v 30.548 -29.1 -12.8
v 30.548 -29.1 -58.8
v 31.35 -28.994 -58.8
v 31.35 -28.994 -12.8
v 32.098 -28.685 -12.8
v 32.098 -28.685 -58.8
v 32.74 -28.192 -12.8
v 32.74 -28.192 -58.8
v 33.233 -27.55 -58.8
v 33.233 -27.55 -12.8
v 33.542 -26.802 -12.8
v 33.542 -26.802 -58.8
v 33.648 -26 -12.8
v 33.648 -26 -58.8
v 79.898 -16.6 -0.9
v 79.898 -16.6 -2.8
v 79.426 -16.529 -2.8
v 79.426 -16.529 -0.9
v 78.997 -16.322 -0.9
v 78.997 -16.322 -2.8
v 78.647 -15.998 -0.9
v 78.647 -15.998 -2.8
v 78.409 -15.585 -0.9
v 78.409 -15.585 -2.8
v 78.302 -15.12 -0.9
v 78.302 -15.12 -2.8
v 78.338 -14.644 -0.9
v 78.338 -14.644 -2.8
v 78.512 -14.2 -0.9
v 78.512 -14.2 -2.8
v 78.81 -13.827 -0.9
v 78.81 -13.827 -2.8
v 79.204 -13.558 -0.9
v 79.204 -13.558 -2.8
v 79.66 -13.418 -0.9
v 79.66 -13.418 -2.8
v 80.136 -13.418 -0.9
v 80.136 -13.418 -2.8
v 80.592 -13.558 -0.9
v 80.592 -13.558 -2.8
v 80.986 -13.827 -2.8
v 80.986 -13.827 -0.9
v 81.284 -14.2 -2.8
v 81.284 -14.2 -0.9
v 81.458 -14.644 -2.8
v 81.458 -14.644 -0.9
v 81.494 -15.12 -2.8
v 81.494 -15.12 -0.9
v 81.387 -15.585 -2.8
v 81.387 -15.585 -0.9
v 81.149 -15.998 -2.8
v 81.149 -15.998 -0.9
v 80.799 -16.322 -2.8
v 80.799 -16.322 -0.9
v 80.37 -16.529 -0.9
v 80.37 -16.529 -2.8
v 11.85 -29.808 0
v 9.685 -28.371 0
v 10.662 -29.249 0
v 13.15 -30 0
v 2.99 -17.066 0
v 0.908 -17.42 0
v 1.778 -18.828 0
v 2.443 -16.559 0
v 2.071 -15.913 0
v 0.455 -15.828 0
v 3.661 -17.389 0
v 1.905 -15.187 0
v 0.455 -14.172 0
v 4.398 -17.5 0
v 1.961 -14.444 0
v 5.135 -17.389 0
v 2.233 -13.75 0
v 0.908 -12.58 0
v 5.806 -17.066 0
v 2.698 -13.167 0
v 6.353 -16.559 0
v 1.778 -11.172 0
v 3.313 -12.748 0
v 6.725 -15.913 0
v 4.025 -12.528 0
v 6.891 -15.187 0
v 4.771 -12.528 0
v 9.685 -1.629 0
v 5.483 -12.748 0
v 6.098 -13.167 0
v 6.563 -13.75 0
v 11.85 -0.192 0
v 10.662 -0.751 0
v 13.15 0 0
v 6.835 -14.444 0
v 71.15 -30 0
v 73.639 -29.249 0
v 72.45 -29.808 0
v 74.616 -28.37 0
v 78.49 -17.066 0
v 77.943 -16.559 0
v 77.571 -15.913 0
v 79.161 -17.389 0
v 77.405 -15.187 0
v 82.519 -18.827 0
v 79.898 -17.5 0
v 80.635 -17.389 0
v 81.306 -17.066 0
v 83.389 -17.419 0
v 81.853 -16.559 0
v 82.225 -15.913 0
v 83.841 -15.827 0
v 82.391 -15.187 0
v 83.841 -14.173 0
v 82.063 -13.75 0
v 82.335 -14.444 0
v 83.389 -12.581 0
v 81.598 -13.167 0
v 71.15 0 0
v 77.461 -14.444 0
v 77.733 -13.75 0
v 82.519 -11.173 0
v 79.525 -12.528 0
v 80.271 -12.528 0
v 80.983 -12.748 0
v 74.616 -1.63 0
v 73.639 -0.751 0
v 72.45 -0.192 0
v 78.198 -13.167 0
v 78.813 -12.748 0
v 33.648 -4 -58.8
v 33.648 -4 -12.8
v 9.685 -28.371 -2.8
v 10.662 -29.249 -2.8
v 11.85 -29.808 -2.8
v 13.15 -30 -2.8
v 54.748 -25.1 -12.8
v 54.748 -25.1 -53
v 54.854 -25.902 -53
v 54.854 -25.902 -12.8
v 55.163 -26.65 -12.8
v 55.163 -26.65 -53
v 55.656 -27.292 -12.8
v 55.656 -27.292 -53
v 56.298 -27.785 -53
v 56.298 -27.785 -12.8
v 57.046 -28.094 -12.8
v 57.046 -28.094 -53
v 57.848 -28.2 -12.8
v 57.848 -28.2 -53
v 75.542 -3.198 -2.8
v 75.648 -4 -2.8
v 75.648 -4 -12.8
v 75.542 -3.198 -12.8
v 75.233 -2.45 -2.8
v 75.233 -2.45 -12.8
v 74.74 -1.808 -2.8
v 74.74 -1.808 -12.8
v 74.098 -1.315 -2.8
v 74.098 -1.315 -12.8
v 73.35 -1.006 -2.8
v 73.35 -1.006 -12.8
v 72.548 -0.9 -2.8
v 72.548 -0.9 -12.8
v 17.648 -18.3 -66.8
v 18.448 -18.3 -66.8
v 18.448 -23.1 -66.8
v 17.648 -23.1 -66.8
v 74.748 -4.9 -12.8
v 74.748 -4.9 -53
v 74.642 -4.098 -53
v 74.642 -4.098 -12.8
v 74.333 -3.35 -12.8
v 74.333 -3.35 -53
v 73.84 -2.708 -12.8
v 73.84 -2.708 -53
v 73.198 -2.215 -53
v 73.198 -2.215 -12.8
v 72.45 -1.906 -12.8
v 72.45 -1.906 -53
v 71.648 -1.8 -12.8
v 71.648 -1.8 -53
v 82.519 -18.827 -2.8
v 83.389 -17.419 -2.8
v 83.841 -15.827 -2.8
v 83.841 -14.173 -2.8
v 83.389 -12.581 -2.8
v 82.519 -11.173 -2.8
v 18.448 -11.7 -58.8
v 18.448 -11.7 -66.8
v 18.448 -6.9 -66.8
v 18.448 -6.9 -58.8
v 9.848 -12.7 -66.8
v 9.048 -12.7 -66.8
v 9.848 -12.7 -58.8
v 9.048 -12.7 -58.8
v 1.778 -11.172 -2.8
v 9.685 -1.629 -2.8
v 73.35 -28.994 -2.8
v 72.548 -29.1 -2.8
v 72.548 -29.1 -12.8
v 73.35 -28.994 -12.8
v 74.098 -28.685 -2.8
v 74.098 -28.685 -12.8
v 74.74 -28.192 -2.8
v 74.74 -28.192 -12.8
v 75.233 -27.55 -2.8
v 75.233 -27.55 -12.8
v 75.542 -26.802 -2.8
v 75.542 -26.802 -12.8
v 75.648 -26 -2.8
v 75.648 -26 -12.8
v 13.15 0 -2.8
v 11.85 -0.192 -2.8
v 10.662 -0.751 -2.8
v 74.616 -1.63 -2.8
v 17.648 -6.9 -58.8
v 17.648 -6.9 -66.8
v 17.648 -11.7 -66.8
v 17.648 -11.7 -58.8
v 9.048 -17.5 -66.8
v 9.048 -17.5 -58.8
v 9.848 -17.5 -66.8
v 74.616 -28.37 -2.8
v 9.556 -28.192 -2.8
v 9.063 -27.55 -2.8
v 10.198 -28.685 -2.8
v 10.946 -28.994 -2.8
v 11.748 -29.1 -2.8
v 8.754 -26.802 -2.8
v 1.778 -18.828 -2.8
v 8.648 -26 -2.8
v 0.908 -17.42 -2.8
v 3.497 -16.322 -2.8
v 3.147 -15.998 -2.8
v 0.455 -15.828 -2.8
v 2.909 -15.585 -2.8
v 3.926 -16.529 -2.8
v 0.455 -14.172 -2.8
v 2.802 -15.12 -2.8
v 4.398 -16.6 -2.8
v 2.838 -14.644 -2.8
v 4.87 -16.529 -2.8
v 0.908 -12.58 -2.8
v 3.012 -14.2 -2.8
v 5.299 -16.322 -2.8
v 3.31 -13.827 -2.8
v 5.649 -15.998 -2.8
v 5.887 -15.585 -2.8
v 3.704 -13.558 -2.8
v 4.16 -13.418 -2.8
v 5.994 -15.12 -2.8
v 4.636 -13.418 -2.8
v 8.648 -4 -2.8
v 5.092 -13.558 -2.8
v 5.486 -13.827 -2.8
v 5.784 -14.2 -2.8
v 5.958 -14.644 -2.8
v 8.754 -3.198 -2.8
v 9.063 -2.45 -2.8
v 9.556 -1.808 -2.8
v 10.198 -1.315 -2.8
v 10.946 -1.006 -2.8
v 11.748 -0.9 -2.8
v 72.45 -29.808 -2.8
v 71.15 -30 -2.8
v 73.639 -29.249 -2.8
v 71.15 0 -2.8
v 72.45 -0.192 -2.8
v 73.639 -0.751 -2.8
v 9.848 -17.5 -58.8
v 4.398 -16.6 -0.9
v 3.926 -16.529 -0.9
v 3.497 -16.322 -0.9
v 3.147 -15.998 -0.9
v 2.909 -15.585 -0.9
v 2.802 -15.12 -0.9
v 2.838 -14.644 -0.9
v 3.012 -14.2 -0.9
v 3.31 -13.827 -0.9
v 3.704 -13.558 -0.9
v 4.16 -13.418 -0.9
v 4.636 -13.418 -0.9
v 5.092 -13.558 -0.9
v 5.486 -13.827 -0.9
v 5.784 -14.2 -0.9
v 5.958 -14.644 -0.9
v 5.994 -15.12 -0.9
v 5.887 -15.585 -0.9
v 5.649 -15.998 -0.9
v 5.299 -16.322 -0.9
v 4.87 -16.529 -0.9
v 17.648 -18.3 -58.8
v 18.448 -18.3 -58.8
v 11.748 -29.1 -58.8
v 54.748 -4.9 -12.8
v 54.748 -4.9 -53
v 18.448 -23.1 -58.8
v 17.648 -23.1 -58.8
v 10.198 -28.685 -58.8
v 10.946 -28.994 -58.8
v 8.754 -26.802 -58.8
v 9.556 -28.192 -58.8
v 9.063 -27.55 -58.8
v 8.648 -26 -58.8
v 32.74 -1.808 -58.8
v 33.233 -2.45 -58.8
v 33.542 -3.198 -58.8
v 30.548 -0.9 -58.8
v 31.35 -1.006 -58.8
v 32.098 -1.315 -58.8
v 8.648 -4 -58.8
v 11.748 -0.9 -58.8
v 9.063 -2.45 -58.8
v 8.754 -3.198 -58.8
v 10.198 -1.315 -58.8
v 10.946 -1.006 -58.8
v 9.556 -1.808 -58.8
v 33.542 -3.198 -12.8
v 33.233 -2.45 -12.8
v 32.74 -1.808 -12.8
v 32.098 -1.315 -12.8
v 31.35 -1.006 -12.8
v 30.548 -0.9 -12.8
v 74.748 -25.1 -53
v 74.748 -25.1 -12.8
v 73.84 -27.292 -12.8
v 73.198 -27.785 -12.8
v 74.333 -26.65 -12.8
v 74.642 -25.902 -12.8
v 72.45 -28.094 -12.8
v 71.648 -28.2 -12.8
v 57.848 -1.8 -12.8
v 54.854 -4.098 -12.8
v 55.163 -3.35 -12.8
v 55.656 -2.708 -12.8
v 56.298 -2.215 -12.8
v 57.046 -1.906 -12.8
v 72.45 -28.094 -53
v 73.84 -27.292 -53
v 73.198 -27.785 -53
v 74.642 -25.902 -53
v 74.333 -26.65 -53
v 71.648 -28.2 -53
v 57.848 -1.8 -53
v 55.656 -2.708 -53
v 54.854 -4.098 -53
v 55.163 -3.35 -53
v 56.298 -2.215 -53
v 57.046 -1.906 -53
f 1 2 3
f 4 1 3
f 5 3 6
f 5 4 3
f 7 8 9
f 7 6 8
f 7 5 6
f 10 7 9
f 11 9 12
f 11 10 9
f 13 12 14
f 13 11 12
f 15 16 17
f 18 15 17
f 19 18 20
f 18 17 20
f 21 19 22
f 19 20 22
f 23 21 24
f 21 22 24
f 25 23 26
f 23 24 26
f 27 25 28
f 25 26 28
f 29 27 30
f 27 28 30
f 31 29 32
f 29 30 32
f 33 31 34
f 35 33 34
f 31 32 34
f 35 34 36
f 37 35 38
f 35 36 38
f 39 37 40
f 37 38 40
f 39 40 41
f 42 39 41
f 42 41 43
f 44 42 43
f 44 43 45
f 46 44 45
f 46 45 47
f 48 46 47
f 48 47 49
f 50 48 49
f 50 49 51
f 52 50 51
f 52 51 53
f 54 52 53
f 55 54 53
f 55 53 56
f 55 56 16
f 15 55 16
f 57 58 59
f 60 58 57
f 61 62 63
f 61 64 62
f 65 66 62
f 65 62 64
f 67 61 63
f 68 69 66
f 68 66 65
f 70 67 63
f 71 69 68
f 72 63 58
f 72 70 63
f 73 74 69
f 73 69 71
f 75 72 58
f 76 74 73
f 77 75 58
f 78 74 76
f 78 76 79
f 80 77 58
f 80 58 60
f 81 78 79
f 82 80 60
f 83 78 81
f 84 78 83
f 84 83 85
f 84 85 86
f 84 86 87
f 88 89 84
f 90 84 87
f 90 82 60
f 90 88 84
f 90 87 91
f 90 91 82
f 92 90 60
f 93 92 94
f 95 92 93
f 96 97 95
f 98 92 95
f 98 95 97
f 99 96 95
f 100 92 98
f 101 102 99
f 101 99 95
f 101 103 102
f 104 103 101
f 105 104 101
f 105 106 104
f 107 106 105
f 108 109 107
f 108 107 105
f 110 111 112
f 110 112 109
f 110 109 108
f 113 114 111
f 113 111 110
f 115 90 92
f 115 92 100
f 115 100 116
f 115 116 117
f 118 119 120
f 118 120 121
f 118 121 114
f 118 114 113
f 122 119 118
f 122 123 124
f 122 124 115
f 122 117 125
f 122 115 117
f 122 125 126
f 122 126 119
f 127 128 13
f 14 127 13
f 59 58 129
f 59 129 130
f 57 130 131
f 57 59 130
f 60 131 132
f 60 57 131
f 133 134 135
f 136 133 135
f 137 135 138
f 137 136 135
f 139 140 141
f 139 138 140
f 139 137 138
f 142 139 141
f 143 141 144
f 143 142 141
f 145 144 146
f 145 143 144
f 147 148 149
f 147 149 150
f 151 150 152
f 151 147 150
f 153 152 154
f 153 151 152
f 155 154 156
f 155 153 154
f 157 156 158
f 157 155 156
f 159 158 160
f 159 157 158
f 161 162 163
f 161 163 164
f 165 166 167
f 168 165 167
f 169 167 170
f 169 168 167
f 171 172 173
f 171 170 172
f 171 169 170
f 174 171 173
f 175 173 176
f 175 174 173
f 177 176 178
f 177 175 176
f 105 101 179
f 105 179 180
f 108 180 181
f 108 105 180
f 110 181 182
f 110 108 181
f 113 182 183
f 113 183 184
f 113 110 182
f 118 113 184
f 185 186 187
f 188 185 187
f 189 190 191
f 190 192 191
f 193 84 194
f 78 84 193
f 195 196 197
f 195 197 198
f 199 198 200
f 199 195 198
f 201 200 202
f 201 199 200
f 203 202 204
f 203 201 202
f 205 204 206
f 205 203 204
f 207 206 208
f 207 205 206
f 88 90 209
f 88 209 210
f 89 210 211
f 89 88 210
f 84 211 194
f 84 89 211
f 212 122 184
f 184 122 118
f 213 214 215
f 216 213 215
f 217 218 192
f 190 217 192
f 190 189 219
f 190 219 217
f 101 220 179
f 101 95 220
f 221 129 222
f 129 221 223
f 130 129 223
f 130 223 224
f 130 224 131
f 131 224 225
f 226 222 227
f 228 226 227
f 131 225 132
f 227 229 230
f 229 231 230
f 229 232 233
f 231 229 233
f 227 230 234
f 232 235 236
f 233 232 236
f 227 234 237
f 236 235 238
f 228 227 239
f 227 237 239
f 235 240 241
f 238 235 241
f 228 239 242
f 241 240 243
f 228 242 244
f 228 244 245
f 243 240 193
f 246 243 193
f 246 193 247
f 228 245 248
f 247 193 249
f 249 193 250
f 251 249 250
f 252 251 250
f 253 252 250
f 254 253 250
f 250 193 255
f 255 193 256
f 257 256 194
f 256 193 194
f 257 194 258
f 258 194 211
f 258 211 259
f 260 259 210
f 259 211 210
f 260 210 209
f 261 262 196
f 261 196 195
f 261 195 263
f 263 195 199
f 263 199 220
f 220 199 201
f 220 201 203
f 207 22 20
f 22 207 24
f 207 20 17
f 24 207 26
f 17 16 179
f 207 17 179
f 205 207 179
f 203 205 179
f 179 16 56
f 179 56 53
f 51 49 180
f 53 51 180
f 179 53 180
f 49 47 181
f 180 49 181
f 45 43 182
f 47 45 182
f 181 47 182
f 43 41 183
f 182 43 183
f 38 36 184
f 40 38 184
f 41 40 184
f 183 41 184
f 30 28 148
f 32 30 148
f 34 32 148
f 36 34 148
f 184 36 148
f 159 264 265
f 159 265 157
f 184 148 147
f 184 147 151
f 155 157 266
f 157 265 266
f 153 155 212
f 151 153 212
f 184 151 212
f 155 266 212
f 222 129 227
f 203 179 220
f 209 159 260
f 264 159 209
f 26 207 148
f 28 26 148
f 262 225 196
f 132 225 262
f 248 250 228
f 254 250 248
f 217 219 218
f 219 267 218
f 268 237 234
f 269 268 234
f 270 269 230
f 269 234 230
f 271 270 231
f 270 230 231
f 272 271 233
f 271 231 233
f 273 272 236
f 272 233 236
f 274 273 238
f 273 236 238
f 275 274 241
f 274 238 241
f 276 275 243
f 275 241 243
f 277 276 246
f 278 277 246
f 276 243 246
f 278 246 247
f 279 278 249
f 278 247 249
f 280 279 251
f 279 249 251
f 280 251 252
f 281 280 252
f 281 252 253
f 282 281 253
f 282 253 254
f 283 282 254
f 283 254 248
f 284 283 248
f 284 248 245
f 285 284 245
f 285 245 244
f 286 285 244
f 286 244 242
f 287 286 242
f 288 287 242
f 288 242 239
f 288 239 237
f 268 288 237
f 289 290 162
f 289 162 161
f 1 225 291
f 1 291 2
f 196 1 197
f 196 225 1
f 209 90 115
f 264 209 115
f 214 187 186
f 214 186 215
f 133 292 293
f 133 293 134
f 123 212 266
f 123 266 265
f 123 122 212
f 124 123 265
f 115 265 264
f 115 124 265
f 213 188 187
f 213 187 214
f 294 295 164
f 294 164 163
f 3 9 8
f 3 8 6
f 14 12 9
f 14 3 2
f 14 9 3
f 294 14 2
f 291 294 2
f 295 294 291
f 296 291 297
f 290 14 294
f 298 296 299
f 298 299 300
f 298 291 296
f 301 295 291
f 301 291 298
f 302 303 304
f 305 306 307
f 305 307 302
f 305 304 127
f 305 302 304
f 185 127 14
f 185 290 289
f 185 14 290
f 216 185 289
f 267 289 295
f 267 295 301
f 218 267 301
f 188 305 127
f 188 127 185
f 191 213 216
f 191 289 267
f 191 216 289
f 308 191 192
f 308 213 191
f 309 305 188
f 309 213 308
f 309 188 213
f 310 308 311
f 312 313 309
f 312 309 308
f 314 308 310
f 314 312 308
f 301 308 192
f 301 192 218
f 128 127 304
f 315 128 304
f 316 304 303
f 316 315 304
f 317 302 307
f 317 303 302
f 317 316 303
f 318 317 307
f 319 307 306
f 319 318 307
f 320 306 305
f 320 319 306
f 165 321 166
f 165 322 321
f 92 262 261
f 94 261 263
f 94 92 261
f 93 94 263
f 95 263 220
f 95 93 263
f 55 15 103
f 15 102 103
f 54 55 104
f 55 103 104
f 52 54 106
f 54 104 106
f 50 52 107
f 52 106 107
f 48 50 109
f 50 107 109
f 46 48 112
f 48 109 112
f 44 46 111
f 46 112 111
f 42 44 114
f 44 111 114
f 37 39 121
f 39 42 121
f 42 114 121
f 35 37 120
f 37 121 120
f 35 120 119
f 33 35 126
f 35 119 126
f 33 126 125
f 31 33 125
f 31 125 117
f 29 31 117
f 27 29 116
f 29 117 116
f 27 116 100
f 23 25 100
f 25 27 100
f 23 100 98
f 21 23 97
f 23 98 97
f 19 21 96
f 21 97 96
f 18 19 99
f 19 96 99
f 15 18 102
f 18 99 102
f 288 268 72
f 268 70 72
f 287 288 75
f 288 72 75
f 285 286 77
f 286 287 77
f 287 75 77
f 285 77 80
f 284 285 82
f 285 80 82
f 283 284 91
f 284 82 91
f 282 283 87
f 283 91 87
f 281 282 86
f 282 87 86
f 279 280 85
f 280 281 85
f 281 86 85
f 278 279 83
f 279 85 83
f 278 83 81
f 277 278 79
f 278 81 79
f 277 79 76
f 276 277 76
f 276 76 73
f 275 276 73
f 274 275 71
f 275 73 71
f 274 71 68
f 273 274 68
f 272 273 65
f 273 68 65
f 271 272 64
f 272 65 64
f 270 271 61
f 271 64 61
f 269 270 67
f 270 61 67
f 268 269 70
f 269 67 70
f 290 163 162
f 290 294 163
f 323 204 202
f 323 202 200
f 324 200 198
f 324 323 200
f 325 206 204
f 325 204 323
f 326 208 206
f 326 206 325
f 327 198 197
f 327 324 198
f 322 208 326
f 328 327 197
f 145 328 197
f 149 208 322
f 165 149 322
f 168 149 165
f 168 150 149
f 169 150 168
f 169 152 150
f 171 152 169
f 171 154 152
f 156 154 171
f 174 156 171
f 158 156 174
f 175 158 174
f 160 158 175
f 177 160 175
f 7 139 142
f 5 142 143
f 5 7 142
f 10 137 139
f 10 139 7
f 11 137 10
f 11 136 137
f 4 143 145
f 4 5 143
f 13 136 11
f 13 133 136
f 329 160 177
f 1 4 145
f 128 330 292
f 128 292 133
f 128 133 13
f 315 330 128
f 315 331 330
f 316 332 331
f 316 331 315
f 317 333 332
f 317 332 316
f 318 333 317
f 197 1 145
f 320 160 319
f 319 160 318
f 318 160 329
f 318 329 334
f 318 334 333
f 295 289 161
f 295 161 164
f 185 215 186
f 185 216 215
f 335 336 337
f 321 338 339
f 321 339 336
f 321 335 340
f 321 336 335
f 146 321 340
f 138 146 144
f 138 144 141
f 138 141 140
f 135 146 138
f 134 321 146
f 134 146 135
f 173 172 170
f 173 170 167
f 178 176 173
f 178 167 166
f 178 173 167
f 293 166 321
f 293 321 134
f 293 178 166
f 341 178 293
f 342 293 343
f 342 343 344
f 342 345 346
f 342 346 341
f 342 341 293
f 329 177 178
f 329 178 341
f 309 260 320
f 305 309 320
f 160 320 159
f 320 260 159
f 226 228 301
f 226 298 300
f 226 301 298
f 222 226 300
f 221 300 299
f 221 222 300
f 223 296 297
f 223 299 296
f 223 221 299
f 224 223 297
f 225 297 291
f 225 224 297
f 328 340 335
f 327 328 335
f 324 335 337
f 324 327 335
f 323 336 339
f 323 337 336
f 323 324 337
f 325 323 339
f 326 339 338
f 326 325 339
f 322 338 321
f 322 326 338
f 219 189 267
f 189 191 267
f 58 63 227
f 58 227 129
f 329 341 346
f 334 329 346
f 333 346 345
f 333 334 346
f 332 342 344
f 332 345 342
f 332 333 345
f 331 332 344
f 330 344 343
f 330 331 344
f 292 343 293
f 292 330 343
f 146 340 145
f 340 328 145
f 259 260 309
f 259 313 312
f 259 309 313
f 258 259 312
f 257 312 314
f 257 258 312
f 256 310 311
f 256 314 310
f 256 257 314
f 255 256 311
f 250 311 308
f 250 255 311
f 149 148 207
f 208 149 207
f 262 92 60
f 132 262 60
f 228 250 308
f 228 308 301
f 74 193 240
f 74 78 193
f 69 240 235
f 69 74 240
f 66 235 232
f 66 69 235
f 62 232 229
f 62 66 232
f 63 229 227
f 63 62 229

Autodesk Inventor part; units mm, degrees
ref_plane "YZ Plane" through (0, 0, 0) normal (1, 0, 0) x (0, 1, 0)
ref_plane "XZ Plane" through (0, 0, 0) normal (0, 1, 0) x (-1, 0, 0)
ref_plane "XY Plane" through (0, 0, 0) normal (0, 0, 1) x (1, 0, 0)
sketch "Skizze1" plane through (0, 0, 0) normal (0, 0, 1) x (1, 0, 0)
  line L0 (13.15, 0) -> (71.15, 0)
  line L1 (71.15, -30) -> (13.15, -30)
  arc A0 (1.7779, -11.1719) -> (1.7779, -18.8281) centre (6.398, -15) ccw
  arc A1 (82.5191, -18.827) -> (82.5191, -11.173) centre (77.898, -15) ccw
  line L2 (13.15, 0) -> (71.15, 0)
  line L3 (71.15, -30) -> (13.15, -30)
  arc A2 (13.15, 0) -> (9.6849, -1.6289) centre (13.15, -4.5) ccw
  arc A3 (9.6849, -28.3711) -> (13.15, -30) centre (13.15, -25.5) ccw
  arc A4 (71.15, -30) -> (74.6158, -28.3702) centre (71.15, -25.5) ccw
  arc A5 (74.6158, -1.6298) -> (71.15, 0) centre (71.15, -4.5) ccw
  line L4 (9.6849, -1.6289) -> (1.7779, -11.1719)
  line L5 (1.7779, -18.8281) -> (9.6849, -28.3711)
  line L6 (74.6158, -28.3702) -> (82.5191, -18.827)
  line L7 (74.6158, -1.6298) -> (82.5191, -11.173)
  line L8 (6.398, -15) -> (77.898, -15) construction
  point P0 (0, 0)
  point P1 (74.85, -30)
  dimension "d2" = 12
  dimension "d3" = 12
  dimension "d6" = 4.5
  dimension "d47" = 71.5
  dimension "d48" = 21
  dimension "d49" = 21
  dimension "d50" = 58
  dimension "d51" = 58
  dimension "d52" = 15
  dimension "d53" = 15
  dimension "d54" = 50.37
  dimension "d55" = 50.37
  dimension "d56" = 50.356
  dimension "d57" = 50.356
extrude "Extrusion1" add sketch "Skizze1" against normal blind 2.8
sketch "Skizze2" plane through (0, 0, 0) normal (0, 0, 1) x (1, 0, 0)
  arc A0 (1.7779, -11.1719) -> (1.7779, -18.8281) centre (6.398, -15) ccw projected
  point P0 (0, 0)
  point P1 (4.398, -15)
  point P2 (79.898, -15)
  dimension "d9" = 75.5
  dimension "d10" = 2
hole "Bohrung1" at (4.398, -15, 0) at (79.898, -15, 0) direction (0, 0, -1) diameter 3.2 end through all countersink diameter 5 countersink angle 90
sketch "Skizze3" plane through (0, 0, -2.8) normal (0, 0, -1) x (-1, 0, 0)
  circle A0 centre (-79.898, -15) radius 1.6 projected
  arc A1 (-13.15, -30) -> (-9.6849, -28.3711) centre (-13.15, -25.5) ccw projected
  line L0 (-16.4119, -28.6) -> (-15.1466, -28.6)
  line L1 (-15.1466, -1.4) -> (-29.2653, -1.4)
  line L2 (-72.548, -29.1) -> (-11.748, -29.1)
  line L3 (-8.648, -26) -> (-8.648, -4)
  line L4 (-11.748, -0.9) -> (-72.548, -0.9)
  line L5 (-75.648, -4) -> (-75.648, -26)
  arc A2 (-75.648, -26) -> (-72.548, -29.1) centre (-72.548, -26) ccw
  arc A3 (-72.548, -0.9) -> (-75.648, -4) centre (-72.548, -4) ccw
  arc A4 (-8.648, -4) -> (-11.748, -0.9) centre (-11.748, -4) ccw
  arc A5 (-11.748, -29.1) -> (-8.648, -26) centre (-11.748, -26) ccw
  line L6 (-13.15, -30) -> (-71.15, -30) projected
  line L7 (-71.15, 0) -> (-13.15, 0) projected
  point P0 (0, 0)
  point P1 (-8.648, -0.9)
  point P2 (-75.648, -0.9)
  dimension "d20" = 67
  dimension "d21" = 4.25
  dimension "d22" = 3.1
  dimension "d44" = 28.2
  dimension "d45" = 0.9
  dimension "d46" = 0.9
extrude "Extrusion2" add sketch "Skizze3" along normal blind 10 contours A2 L5 A3 L4 A4 L3 A5 L2
sketch "Skizze4" plane through (0, 0, -12.8) normal (0, 0, -1) x (-1, 0, 0)
  line L0 (-11.748, -29.1) -> (-72.548, -29.1) projected
  line L1 (-8.648, -4) -> (-8.648, -26) projected
  line L2 (-11.748, -0.9) -> (-30.548, -0.9)
  line L3 (-33.648, -4) -> (-33.648, -26)
  line L4 (-30.548, -29.1) -> (-11.748, -29.1)
  line L5 (-8.648, -26) -> (-8.648, -4)
  arc A0 (-11.748, -29.1) -> (-8.648, -26) centre (-11.748, -26) ccw
  arc A1 (-8.648, -4) -> (-11.748, -0.9) centre (-11.748, -4) ccw
  arc A2 (-30.548, -0.9) -> (-33.648, -4) centre (-30.548, -4) ccw
  arc A3 (-33.648, -26) -> (-30.548, -29.1) centre (-30.548, -26) ccw
  point P0 (0, 0)
  point P1 (-33.648, -29.1)
  dimension "d25" = 25
  dimension "d26" = 3.1
  dimension "d27" = 0
  dimension "d28" = 3.1
extrude "Extrusion3" add sketch "Skizze4" along normal blind 46
sketch "Skizze5" plane through (0, 0, -58.8) normal (0, 0, -1) x (-1, 0, 0)
  line L0 (-8.648, -4) -> (-8.648, -26) projected
  line L1 (-11.748, -29.1) -> (-30.548, -29.1) projected
  line L2 (-9.848, -17.5) -> (-9.048, -17.5)
  line L3 (-9.048, -17.5) -> (-9.048, -12.7)
  line L4 (-9.048, -12.7) -> (-9.848, -12.7)
  line L5 (-9.848, -12.7) -> (-9.848, -17.5)
  line L6 (-30.548, -0.9) -> (-11.748, -0.9) projected
  line L7 (-18.448, -6.9) -> (-17.648, -6.9)
  line L8 (-17.648, -6.9) -> (-17.648, -11.7)
  line L9 (-17.648, -11.7) -> (-18.448, -11.7)
  line L10 (-18.448, -11.7) -> (-18.448, -6.9)
  line L11 (-18.448, -18.3) -> (-17.648, -18.3)
  line L12 (-17.648, -18.3) -> (-17.648, -23.1)
  line L13 (-17.648, -23.1) -> (-18.448, -23.1)
  line L14 (-18.448, -23.1) -> (-18.448, -18.3)
  point P0 (0, 0)
  dimension "d31" = 0.4
  dimension "d33" = 0.8
  dimension "d35" = 4.8
  dimension "d37" = 11.6
  dimension "d62" = 0.8
  dimension "d63" = 0.8
  dimension "d64" = 4.8
  dimension "d65" = 4.8
  dimension "d66" = 6
  dimension "d67" = 6
  dimension "d68" = 0
  dimension "d69" = 9
extrude "Extrusion4" add sketch "Skizze5" along normal blind 8
sketch "Skizze6" plane through (0, 0, -12.8) normal (0, 0, -1) x (-1, 0, 0)
  line L0 (-30.548, -29.1) -> (-72.548, -29.1) projected
  line L1 (-71.648, -1.8) -> (-57.848, -1.8)
  line L2 (-54.748, -4.9) -> (-54.748, -25.1)
  line L3 (-74.748, -25.1) -> (-74.748, -4.9)
  arc A0 (-71.648, -1.8) -> (-74.748, -4.9) centre (-71.648, -4.9) ccw
  arc A1 (-54.748, -4.9) -> (-57.848, -1.8) centre (-57.848, -4.9) ccw
  arc A2 (-57.848, -28.2) -> (-54.748, -25.1) centre (-57.848, -25.1) ccw
  arc A3 (-74.748, -25.1) -> (-71.648, -28.2) centre (-71.648, -25.1) ccw
  line L4 (-72.548, -0.9) -> (-30.548, -0.9) projected
  line L5 (-75.648, -26) -> (-75.648, -4) projected
  line L6 (-33.648, -26) -> (-33.648, -4) projected
  line L7 (-71.648, -28.2) -> (-57.848, -28.2)
  point P0 (0, 0)
  point P1 (-54.748, -29.1)
  dimension "d40" = 20
  dimension "d41" = 3.1
  dimension "d58" = 0.9
  dimension "d59" = 0.9
  dimension "d60" = 0.9
  dimension "d61" = 26.4
extrude "Extrusion5" add sketch "Skizze6" along normal blind 40.2
equation "\"d2\" = d3"
properties part number "Schurter_CDG4_4101_151"
